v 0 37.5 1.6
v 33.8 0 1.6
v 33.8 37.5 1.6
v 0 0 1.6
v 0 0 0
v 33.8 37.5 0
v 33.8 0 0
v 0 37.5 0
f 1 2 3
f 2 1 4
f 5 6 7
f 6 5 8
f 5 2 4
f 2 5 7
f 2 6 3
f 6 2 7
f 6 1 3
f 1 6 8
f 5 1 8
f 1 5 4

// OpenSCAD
$fn = 64;

board_x = 33.8;
board_y = 37.5;
board_th = 1.6;

color([0.05, 0.45, 0.12])
cube([board_x, board_y, board_th], center=false);
